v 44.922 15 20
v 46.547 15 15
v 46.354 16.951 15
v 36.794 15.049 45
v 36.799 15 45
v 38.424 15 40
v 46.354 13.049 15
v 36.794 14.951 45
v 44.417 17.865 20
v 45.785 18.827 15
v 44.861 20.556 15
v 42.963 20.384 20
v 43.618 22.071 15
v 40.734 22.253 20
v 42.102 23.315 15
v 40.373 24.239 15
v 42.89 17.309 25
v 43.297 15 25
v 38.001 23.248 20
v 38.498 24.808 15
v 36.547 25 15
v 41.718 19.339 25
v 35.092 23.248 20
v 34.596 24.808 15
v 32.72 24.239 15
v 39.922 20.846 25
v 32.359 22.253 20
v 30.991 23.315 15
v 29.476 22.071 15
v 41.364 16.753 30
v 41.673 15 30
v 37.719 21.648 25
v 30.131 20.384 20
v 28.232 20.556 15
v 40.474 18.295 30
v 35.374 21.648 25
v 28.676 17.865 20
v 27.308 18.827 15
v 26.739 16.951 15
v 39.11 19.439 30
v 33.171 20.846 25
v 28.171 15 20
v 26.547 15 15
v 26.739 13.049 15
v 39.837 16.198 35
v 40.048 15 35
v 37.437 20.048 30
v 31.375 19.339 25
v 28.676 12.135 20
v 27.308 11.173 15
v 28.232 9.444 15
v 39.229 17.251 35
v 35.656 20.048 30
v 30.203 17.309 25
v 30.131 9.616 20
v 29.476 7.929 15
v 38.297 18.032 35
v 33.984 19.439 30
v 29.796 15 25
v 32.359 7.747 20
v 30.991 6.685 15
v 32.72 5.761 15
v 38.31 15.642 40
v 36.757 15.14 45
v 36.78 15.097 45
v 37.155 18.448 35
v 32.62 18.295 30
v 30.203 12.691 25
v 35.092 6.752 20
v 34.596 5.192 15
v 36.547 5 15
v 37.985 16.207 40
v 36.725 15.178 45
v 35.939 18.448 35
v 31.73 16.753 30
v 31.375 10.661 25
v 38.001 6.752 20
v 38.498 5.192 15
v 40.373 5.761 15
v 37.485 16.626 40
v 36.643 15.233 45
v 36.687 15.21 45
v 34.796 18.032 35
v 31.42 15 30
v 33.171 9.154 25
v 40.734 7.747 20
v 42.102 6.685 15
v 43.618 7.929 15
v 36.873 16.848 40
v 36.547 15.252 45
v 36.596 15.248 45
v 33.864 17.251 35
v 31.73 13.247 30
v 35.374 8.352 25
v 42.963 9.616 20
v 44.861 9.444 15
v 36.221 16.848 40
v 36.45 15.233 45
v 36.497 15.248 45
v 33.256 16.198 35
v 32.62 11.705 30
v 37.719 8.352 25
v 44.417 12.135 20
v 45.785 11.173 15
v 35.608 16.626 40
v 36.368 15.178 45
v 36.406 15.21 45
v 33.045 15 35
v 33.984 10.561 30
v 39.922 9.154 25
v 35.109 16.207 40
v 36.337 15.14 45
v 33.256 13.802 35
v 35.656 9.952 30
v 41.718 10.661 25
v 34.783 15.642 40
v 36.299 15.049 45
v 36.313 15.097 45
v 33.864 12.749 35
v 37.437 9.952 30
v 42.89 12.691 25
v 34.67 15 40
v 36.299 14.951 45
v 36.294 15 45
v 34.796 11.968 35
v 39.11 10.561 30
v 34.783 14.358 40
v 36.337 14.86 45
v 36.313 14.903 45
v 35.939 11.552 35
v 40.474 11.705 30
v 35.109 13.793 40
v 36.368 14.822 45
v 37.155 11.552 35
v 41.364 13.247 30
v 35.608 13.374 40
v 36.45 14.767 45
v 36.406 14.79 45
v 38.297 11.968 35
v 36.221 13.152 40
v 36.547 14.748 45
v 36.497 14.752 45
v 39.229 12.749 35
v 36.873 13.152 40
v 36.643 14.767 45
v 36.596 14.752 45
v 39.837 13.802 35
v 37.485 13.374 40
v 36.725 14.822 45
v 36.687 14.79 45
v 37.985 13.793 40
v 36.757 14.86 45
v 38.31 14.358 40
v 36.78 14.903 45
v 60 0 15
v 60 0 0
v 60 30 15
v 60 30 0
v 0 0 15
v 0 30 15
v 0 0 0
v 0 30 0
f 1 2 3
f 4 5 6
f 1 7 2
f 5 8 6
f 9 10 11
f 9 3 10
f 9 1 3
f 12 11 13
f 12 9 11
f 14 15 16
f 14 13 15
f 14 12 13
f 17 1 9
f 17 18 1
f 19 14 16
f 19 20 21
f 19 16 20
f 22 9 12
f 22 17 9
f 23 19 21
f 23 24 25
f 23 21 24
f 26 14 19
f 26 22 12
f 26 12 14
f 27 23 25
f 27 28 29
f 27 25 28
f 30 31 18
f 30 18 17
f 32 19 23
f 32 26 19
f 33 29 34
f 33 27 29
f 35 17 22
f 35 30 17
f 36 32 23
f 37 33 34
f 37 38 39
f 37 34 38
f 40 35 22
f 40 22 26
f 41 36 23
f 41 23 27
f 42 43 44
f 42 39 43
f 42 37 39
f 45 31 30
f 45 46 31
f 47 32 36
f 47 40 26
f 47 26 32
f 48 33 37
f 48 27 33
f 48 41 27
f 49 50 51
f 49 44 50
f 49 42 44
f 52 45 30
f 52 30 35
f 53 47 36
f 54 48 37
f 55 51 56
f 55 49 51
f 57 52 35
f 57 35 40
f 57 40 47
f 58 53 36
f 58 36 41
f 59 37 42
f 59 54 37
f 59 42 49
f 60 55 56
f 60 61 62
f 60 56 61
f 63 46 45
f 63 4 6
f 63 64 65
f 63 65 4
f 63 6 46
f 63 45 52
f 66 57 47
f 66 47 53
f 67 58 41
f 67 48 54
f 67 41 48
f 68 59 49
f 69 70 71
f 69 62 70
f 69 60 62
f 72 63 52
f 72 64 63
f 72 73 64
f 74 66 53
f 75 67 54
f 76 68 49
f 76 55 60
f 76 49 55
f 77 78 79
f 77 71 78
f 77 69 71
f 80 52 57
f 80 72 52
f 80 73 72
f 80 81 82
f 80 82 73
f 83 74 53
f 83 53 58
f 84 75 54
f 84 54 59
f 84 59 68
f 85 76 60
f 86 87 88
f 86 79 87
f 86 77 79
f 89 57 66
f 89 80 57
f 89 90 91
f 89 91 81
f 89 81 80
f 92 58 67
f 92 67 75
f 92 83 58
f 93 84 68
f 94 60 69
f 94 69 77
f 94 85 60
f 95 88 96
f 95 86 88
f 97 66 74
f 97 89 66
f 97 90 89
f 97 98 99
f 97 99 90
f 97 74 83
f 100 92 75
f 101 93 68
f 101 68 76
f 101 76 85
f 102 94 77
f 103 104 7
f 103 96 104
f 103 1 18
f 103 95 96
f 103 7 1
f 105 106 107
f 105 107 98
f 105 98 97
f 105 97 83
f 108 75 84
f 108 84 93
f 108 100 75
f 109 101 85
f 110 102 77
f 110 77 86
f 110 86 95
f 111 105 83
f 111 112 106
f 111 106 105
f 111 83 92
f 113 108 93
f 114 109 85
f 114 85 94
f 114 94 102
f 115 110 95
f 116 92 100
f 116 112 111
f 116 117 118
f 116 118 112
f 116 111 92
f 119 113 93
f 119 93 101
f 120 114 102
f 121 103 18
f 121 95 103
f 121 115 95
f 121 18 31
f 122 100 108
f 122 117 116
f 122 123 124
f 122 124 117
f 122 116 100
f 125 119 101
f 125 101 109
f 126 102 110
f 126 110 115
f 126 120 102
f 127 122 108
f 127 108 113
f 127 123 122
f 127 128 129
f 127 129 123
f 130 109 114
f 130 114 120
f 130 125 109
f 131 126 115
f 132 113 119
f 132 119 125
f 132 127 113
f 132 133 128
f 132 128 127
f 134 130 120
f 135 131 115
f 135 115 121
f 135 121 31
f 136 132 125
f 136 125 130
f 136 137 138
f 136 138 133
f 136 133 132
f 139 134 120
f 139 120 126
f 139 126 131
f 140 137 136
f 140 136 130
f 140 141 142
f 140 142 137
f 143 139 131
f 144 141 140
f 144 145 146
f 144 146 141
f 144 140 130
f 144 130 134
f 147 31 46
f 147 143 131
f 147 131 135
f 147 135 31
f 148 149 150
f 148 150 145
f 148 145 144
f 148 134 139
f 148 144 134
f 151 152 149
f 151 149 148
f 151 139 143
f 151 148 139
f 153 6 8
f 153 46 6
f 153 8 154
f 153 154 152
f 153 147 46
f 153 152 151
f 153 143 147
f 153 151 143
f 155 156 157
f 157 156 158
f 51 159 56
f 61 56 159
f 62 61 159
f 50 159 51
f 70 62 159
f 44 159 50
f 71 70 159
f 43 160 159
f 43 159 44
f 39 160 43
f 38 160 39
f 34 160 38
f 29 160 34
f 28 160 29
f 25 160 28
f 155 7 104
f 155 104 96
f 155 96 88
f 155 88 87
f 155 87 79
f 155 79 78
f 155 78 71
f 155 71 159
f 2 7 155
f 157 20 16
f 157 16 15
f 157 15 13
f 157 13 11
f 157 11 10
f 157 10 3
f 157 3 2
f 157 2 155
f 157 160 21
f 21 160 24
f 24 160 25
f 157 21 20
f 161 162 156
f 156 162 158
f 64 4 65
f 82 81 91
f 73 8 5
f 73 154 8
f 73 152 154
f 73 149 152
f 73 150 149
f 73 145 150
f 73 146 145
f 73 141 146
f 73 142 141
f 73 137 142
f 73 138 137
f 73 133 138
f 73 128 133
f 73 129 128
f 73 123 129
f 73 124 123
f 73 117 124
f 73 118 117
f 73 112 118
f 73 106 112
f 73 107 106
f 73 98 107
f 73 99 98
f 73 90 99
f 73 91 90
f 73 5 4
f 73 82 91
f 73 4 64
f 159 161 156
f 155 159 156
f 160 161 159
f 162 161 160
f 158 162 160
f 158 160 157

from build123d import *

# Parameters (mm, degrees)
F0_W     = 60
F0_H     = 30
F1_DEPTH = 15
F2_R     = 10
F3_DEPTH = 30
F3_TAPER = 18


with BuildPart() as f1:
    # F0 (on Top) → F1 (new body)
    with BuildSketch(Plane.XY):
        with Locations((30, 15)):
            Rectangle(F0_W, F0_H)
    extrude(amount=F1_DEPTH)

    # F2 (on face) → F3 (join)
    with BuildSketch(Plane.XY.offset(15)):
        with Locations((36.5466400981, 15)):
            Circle(F2_R)
    extrude(amount=F3_DEPTH, taper=F3_TAPER)


solid = f1.part
